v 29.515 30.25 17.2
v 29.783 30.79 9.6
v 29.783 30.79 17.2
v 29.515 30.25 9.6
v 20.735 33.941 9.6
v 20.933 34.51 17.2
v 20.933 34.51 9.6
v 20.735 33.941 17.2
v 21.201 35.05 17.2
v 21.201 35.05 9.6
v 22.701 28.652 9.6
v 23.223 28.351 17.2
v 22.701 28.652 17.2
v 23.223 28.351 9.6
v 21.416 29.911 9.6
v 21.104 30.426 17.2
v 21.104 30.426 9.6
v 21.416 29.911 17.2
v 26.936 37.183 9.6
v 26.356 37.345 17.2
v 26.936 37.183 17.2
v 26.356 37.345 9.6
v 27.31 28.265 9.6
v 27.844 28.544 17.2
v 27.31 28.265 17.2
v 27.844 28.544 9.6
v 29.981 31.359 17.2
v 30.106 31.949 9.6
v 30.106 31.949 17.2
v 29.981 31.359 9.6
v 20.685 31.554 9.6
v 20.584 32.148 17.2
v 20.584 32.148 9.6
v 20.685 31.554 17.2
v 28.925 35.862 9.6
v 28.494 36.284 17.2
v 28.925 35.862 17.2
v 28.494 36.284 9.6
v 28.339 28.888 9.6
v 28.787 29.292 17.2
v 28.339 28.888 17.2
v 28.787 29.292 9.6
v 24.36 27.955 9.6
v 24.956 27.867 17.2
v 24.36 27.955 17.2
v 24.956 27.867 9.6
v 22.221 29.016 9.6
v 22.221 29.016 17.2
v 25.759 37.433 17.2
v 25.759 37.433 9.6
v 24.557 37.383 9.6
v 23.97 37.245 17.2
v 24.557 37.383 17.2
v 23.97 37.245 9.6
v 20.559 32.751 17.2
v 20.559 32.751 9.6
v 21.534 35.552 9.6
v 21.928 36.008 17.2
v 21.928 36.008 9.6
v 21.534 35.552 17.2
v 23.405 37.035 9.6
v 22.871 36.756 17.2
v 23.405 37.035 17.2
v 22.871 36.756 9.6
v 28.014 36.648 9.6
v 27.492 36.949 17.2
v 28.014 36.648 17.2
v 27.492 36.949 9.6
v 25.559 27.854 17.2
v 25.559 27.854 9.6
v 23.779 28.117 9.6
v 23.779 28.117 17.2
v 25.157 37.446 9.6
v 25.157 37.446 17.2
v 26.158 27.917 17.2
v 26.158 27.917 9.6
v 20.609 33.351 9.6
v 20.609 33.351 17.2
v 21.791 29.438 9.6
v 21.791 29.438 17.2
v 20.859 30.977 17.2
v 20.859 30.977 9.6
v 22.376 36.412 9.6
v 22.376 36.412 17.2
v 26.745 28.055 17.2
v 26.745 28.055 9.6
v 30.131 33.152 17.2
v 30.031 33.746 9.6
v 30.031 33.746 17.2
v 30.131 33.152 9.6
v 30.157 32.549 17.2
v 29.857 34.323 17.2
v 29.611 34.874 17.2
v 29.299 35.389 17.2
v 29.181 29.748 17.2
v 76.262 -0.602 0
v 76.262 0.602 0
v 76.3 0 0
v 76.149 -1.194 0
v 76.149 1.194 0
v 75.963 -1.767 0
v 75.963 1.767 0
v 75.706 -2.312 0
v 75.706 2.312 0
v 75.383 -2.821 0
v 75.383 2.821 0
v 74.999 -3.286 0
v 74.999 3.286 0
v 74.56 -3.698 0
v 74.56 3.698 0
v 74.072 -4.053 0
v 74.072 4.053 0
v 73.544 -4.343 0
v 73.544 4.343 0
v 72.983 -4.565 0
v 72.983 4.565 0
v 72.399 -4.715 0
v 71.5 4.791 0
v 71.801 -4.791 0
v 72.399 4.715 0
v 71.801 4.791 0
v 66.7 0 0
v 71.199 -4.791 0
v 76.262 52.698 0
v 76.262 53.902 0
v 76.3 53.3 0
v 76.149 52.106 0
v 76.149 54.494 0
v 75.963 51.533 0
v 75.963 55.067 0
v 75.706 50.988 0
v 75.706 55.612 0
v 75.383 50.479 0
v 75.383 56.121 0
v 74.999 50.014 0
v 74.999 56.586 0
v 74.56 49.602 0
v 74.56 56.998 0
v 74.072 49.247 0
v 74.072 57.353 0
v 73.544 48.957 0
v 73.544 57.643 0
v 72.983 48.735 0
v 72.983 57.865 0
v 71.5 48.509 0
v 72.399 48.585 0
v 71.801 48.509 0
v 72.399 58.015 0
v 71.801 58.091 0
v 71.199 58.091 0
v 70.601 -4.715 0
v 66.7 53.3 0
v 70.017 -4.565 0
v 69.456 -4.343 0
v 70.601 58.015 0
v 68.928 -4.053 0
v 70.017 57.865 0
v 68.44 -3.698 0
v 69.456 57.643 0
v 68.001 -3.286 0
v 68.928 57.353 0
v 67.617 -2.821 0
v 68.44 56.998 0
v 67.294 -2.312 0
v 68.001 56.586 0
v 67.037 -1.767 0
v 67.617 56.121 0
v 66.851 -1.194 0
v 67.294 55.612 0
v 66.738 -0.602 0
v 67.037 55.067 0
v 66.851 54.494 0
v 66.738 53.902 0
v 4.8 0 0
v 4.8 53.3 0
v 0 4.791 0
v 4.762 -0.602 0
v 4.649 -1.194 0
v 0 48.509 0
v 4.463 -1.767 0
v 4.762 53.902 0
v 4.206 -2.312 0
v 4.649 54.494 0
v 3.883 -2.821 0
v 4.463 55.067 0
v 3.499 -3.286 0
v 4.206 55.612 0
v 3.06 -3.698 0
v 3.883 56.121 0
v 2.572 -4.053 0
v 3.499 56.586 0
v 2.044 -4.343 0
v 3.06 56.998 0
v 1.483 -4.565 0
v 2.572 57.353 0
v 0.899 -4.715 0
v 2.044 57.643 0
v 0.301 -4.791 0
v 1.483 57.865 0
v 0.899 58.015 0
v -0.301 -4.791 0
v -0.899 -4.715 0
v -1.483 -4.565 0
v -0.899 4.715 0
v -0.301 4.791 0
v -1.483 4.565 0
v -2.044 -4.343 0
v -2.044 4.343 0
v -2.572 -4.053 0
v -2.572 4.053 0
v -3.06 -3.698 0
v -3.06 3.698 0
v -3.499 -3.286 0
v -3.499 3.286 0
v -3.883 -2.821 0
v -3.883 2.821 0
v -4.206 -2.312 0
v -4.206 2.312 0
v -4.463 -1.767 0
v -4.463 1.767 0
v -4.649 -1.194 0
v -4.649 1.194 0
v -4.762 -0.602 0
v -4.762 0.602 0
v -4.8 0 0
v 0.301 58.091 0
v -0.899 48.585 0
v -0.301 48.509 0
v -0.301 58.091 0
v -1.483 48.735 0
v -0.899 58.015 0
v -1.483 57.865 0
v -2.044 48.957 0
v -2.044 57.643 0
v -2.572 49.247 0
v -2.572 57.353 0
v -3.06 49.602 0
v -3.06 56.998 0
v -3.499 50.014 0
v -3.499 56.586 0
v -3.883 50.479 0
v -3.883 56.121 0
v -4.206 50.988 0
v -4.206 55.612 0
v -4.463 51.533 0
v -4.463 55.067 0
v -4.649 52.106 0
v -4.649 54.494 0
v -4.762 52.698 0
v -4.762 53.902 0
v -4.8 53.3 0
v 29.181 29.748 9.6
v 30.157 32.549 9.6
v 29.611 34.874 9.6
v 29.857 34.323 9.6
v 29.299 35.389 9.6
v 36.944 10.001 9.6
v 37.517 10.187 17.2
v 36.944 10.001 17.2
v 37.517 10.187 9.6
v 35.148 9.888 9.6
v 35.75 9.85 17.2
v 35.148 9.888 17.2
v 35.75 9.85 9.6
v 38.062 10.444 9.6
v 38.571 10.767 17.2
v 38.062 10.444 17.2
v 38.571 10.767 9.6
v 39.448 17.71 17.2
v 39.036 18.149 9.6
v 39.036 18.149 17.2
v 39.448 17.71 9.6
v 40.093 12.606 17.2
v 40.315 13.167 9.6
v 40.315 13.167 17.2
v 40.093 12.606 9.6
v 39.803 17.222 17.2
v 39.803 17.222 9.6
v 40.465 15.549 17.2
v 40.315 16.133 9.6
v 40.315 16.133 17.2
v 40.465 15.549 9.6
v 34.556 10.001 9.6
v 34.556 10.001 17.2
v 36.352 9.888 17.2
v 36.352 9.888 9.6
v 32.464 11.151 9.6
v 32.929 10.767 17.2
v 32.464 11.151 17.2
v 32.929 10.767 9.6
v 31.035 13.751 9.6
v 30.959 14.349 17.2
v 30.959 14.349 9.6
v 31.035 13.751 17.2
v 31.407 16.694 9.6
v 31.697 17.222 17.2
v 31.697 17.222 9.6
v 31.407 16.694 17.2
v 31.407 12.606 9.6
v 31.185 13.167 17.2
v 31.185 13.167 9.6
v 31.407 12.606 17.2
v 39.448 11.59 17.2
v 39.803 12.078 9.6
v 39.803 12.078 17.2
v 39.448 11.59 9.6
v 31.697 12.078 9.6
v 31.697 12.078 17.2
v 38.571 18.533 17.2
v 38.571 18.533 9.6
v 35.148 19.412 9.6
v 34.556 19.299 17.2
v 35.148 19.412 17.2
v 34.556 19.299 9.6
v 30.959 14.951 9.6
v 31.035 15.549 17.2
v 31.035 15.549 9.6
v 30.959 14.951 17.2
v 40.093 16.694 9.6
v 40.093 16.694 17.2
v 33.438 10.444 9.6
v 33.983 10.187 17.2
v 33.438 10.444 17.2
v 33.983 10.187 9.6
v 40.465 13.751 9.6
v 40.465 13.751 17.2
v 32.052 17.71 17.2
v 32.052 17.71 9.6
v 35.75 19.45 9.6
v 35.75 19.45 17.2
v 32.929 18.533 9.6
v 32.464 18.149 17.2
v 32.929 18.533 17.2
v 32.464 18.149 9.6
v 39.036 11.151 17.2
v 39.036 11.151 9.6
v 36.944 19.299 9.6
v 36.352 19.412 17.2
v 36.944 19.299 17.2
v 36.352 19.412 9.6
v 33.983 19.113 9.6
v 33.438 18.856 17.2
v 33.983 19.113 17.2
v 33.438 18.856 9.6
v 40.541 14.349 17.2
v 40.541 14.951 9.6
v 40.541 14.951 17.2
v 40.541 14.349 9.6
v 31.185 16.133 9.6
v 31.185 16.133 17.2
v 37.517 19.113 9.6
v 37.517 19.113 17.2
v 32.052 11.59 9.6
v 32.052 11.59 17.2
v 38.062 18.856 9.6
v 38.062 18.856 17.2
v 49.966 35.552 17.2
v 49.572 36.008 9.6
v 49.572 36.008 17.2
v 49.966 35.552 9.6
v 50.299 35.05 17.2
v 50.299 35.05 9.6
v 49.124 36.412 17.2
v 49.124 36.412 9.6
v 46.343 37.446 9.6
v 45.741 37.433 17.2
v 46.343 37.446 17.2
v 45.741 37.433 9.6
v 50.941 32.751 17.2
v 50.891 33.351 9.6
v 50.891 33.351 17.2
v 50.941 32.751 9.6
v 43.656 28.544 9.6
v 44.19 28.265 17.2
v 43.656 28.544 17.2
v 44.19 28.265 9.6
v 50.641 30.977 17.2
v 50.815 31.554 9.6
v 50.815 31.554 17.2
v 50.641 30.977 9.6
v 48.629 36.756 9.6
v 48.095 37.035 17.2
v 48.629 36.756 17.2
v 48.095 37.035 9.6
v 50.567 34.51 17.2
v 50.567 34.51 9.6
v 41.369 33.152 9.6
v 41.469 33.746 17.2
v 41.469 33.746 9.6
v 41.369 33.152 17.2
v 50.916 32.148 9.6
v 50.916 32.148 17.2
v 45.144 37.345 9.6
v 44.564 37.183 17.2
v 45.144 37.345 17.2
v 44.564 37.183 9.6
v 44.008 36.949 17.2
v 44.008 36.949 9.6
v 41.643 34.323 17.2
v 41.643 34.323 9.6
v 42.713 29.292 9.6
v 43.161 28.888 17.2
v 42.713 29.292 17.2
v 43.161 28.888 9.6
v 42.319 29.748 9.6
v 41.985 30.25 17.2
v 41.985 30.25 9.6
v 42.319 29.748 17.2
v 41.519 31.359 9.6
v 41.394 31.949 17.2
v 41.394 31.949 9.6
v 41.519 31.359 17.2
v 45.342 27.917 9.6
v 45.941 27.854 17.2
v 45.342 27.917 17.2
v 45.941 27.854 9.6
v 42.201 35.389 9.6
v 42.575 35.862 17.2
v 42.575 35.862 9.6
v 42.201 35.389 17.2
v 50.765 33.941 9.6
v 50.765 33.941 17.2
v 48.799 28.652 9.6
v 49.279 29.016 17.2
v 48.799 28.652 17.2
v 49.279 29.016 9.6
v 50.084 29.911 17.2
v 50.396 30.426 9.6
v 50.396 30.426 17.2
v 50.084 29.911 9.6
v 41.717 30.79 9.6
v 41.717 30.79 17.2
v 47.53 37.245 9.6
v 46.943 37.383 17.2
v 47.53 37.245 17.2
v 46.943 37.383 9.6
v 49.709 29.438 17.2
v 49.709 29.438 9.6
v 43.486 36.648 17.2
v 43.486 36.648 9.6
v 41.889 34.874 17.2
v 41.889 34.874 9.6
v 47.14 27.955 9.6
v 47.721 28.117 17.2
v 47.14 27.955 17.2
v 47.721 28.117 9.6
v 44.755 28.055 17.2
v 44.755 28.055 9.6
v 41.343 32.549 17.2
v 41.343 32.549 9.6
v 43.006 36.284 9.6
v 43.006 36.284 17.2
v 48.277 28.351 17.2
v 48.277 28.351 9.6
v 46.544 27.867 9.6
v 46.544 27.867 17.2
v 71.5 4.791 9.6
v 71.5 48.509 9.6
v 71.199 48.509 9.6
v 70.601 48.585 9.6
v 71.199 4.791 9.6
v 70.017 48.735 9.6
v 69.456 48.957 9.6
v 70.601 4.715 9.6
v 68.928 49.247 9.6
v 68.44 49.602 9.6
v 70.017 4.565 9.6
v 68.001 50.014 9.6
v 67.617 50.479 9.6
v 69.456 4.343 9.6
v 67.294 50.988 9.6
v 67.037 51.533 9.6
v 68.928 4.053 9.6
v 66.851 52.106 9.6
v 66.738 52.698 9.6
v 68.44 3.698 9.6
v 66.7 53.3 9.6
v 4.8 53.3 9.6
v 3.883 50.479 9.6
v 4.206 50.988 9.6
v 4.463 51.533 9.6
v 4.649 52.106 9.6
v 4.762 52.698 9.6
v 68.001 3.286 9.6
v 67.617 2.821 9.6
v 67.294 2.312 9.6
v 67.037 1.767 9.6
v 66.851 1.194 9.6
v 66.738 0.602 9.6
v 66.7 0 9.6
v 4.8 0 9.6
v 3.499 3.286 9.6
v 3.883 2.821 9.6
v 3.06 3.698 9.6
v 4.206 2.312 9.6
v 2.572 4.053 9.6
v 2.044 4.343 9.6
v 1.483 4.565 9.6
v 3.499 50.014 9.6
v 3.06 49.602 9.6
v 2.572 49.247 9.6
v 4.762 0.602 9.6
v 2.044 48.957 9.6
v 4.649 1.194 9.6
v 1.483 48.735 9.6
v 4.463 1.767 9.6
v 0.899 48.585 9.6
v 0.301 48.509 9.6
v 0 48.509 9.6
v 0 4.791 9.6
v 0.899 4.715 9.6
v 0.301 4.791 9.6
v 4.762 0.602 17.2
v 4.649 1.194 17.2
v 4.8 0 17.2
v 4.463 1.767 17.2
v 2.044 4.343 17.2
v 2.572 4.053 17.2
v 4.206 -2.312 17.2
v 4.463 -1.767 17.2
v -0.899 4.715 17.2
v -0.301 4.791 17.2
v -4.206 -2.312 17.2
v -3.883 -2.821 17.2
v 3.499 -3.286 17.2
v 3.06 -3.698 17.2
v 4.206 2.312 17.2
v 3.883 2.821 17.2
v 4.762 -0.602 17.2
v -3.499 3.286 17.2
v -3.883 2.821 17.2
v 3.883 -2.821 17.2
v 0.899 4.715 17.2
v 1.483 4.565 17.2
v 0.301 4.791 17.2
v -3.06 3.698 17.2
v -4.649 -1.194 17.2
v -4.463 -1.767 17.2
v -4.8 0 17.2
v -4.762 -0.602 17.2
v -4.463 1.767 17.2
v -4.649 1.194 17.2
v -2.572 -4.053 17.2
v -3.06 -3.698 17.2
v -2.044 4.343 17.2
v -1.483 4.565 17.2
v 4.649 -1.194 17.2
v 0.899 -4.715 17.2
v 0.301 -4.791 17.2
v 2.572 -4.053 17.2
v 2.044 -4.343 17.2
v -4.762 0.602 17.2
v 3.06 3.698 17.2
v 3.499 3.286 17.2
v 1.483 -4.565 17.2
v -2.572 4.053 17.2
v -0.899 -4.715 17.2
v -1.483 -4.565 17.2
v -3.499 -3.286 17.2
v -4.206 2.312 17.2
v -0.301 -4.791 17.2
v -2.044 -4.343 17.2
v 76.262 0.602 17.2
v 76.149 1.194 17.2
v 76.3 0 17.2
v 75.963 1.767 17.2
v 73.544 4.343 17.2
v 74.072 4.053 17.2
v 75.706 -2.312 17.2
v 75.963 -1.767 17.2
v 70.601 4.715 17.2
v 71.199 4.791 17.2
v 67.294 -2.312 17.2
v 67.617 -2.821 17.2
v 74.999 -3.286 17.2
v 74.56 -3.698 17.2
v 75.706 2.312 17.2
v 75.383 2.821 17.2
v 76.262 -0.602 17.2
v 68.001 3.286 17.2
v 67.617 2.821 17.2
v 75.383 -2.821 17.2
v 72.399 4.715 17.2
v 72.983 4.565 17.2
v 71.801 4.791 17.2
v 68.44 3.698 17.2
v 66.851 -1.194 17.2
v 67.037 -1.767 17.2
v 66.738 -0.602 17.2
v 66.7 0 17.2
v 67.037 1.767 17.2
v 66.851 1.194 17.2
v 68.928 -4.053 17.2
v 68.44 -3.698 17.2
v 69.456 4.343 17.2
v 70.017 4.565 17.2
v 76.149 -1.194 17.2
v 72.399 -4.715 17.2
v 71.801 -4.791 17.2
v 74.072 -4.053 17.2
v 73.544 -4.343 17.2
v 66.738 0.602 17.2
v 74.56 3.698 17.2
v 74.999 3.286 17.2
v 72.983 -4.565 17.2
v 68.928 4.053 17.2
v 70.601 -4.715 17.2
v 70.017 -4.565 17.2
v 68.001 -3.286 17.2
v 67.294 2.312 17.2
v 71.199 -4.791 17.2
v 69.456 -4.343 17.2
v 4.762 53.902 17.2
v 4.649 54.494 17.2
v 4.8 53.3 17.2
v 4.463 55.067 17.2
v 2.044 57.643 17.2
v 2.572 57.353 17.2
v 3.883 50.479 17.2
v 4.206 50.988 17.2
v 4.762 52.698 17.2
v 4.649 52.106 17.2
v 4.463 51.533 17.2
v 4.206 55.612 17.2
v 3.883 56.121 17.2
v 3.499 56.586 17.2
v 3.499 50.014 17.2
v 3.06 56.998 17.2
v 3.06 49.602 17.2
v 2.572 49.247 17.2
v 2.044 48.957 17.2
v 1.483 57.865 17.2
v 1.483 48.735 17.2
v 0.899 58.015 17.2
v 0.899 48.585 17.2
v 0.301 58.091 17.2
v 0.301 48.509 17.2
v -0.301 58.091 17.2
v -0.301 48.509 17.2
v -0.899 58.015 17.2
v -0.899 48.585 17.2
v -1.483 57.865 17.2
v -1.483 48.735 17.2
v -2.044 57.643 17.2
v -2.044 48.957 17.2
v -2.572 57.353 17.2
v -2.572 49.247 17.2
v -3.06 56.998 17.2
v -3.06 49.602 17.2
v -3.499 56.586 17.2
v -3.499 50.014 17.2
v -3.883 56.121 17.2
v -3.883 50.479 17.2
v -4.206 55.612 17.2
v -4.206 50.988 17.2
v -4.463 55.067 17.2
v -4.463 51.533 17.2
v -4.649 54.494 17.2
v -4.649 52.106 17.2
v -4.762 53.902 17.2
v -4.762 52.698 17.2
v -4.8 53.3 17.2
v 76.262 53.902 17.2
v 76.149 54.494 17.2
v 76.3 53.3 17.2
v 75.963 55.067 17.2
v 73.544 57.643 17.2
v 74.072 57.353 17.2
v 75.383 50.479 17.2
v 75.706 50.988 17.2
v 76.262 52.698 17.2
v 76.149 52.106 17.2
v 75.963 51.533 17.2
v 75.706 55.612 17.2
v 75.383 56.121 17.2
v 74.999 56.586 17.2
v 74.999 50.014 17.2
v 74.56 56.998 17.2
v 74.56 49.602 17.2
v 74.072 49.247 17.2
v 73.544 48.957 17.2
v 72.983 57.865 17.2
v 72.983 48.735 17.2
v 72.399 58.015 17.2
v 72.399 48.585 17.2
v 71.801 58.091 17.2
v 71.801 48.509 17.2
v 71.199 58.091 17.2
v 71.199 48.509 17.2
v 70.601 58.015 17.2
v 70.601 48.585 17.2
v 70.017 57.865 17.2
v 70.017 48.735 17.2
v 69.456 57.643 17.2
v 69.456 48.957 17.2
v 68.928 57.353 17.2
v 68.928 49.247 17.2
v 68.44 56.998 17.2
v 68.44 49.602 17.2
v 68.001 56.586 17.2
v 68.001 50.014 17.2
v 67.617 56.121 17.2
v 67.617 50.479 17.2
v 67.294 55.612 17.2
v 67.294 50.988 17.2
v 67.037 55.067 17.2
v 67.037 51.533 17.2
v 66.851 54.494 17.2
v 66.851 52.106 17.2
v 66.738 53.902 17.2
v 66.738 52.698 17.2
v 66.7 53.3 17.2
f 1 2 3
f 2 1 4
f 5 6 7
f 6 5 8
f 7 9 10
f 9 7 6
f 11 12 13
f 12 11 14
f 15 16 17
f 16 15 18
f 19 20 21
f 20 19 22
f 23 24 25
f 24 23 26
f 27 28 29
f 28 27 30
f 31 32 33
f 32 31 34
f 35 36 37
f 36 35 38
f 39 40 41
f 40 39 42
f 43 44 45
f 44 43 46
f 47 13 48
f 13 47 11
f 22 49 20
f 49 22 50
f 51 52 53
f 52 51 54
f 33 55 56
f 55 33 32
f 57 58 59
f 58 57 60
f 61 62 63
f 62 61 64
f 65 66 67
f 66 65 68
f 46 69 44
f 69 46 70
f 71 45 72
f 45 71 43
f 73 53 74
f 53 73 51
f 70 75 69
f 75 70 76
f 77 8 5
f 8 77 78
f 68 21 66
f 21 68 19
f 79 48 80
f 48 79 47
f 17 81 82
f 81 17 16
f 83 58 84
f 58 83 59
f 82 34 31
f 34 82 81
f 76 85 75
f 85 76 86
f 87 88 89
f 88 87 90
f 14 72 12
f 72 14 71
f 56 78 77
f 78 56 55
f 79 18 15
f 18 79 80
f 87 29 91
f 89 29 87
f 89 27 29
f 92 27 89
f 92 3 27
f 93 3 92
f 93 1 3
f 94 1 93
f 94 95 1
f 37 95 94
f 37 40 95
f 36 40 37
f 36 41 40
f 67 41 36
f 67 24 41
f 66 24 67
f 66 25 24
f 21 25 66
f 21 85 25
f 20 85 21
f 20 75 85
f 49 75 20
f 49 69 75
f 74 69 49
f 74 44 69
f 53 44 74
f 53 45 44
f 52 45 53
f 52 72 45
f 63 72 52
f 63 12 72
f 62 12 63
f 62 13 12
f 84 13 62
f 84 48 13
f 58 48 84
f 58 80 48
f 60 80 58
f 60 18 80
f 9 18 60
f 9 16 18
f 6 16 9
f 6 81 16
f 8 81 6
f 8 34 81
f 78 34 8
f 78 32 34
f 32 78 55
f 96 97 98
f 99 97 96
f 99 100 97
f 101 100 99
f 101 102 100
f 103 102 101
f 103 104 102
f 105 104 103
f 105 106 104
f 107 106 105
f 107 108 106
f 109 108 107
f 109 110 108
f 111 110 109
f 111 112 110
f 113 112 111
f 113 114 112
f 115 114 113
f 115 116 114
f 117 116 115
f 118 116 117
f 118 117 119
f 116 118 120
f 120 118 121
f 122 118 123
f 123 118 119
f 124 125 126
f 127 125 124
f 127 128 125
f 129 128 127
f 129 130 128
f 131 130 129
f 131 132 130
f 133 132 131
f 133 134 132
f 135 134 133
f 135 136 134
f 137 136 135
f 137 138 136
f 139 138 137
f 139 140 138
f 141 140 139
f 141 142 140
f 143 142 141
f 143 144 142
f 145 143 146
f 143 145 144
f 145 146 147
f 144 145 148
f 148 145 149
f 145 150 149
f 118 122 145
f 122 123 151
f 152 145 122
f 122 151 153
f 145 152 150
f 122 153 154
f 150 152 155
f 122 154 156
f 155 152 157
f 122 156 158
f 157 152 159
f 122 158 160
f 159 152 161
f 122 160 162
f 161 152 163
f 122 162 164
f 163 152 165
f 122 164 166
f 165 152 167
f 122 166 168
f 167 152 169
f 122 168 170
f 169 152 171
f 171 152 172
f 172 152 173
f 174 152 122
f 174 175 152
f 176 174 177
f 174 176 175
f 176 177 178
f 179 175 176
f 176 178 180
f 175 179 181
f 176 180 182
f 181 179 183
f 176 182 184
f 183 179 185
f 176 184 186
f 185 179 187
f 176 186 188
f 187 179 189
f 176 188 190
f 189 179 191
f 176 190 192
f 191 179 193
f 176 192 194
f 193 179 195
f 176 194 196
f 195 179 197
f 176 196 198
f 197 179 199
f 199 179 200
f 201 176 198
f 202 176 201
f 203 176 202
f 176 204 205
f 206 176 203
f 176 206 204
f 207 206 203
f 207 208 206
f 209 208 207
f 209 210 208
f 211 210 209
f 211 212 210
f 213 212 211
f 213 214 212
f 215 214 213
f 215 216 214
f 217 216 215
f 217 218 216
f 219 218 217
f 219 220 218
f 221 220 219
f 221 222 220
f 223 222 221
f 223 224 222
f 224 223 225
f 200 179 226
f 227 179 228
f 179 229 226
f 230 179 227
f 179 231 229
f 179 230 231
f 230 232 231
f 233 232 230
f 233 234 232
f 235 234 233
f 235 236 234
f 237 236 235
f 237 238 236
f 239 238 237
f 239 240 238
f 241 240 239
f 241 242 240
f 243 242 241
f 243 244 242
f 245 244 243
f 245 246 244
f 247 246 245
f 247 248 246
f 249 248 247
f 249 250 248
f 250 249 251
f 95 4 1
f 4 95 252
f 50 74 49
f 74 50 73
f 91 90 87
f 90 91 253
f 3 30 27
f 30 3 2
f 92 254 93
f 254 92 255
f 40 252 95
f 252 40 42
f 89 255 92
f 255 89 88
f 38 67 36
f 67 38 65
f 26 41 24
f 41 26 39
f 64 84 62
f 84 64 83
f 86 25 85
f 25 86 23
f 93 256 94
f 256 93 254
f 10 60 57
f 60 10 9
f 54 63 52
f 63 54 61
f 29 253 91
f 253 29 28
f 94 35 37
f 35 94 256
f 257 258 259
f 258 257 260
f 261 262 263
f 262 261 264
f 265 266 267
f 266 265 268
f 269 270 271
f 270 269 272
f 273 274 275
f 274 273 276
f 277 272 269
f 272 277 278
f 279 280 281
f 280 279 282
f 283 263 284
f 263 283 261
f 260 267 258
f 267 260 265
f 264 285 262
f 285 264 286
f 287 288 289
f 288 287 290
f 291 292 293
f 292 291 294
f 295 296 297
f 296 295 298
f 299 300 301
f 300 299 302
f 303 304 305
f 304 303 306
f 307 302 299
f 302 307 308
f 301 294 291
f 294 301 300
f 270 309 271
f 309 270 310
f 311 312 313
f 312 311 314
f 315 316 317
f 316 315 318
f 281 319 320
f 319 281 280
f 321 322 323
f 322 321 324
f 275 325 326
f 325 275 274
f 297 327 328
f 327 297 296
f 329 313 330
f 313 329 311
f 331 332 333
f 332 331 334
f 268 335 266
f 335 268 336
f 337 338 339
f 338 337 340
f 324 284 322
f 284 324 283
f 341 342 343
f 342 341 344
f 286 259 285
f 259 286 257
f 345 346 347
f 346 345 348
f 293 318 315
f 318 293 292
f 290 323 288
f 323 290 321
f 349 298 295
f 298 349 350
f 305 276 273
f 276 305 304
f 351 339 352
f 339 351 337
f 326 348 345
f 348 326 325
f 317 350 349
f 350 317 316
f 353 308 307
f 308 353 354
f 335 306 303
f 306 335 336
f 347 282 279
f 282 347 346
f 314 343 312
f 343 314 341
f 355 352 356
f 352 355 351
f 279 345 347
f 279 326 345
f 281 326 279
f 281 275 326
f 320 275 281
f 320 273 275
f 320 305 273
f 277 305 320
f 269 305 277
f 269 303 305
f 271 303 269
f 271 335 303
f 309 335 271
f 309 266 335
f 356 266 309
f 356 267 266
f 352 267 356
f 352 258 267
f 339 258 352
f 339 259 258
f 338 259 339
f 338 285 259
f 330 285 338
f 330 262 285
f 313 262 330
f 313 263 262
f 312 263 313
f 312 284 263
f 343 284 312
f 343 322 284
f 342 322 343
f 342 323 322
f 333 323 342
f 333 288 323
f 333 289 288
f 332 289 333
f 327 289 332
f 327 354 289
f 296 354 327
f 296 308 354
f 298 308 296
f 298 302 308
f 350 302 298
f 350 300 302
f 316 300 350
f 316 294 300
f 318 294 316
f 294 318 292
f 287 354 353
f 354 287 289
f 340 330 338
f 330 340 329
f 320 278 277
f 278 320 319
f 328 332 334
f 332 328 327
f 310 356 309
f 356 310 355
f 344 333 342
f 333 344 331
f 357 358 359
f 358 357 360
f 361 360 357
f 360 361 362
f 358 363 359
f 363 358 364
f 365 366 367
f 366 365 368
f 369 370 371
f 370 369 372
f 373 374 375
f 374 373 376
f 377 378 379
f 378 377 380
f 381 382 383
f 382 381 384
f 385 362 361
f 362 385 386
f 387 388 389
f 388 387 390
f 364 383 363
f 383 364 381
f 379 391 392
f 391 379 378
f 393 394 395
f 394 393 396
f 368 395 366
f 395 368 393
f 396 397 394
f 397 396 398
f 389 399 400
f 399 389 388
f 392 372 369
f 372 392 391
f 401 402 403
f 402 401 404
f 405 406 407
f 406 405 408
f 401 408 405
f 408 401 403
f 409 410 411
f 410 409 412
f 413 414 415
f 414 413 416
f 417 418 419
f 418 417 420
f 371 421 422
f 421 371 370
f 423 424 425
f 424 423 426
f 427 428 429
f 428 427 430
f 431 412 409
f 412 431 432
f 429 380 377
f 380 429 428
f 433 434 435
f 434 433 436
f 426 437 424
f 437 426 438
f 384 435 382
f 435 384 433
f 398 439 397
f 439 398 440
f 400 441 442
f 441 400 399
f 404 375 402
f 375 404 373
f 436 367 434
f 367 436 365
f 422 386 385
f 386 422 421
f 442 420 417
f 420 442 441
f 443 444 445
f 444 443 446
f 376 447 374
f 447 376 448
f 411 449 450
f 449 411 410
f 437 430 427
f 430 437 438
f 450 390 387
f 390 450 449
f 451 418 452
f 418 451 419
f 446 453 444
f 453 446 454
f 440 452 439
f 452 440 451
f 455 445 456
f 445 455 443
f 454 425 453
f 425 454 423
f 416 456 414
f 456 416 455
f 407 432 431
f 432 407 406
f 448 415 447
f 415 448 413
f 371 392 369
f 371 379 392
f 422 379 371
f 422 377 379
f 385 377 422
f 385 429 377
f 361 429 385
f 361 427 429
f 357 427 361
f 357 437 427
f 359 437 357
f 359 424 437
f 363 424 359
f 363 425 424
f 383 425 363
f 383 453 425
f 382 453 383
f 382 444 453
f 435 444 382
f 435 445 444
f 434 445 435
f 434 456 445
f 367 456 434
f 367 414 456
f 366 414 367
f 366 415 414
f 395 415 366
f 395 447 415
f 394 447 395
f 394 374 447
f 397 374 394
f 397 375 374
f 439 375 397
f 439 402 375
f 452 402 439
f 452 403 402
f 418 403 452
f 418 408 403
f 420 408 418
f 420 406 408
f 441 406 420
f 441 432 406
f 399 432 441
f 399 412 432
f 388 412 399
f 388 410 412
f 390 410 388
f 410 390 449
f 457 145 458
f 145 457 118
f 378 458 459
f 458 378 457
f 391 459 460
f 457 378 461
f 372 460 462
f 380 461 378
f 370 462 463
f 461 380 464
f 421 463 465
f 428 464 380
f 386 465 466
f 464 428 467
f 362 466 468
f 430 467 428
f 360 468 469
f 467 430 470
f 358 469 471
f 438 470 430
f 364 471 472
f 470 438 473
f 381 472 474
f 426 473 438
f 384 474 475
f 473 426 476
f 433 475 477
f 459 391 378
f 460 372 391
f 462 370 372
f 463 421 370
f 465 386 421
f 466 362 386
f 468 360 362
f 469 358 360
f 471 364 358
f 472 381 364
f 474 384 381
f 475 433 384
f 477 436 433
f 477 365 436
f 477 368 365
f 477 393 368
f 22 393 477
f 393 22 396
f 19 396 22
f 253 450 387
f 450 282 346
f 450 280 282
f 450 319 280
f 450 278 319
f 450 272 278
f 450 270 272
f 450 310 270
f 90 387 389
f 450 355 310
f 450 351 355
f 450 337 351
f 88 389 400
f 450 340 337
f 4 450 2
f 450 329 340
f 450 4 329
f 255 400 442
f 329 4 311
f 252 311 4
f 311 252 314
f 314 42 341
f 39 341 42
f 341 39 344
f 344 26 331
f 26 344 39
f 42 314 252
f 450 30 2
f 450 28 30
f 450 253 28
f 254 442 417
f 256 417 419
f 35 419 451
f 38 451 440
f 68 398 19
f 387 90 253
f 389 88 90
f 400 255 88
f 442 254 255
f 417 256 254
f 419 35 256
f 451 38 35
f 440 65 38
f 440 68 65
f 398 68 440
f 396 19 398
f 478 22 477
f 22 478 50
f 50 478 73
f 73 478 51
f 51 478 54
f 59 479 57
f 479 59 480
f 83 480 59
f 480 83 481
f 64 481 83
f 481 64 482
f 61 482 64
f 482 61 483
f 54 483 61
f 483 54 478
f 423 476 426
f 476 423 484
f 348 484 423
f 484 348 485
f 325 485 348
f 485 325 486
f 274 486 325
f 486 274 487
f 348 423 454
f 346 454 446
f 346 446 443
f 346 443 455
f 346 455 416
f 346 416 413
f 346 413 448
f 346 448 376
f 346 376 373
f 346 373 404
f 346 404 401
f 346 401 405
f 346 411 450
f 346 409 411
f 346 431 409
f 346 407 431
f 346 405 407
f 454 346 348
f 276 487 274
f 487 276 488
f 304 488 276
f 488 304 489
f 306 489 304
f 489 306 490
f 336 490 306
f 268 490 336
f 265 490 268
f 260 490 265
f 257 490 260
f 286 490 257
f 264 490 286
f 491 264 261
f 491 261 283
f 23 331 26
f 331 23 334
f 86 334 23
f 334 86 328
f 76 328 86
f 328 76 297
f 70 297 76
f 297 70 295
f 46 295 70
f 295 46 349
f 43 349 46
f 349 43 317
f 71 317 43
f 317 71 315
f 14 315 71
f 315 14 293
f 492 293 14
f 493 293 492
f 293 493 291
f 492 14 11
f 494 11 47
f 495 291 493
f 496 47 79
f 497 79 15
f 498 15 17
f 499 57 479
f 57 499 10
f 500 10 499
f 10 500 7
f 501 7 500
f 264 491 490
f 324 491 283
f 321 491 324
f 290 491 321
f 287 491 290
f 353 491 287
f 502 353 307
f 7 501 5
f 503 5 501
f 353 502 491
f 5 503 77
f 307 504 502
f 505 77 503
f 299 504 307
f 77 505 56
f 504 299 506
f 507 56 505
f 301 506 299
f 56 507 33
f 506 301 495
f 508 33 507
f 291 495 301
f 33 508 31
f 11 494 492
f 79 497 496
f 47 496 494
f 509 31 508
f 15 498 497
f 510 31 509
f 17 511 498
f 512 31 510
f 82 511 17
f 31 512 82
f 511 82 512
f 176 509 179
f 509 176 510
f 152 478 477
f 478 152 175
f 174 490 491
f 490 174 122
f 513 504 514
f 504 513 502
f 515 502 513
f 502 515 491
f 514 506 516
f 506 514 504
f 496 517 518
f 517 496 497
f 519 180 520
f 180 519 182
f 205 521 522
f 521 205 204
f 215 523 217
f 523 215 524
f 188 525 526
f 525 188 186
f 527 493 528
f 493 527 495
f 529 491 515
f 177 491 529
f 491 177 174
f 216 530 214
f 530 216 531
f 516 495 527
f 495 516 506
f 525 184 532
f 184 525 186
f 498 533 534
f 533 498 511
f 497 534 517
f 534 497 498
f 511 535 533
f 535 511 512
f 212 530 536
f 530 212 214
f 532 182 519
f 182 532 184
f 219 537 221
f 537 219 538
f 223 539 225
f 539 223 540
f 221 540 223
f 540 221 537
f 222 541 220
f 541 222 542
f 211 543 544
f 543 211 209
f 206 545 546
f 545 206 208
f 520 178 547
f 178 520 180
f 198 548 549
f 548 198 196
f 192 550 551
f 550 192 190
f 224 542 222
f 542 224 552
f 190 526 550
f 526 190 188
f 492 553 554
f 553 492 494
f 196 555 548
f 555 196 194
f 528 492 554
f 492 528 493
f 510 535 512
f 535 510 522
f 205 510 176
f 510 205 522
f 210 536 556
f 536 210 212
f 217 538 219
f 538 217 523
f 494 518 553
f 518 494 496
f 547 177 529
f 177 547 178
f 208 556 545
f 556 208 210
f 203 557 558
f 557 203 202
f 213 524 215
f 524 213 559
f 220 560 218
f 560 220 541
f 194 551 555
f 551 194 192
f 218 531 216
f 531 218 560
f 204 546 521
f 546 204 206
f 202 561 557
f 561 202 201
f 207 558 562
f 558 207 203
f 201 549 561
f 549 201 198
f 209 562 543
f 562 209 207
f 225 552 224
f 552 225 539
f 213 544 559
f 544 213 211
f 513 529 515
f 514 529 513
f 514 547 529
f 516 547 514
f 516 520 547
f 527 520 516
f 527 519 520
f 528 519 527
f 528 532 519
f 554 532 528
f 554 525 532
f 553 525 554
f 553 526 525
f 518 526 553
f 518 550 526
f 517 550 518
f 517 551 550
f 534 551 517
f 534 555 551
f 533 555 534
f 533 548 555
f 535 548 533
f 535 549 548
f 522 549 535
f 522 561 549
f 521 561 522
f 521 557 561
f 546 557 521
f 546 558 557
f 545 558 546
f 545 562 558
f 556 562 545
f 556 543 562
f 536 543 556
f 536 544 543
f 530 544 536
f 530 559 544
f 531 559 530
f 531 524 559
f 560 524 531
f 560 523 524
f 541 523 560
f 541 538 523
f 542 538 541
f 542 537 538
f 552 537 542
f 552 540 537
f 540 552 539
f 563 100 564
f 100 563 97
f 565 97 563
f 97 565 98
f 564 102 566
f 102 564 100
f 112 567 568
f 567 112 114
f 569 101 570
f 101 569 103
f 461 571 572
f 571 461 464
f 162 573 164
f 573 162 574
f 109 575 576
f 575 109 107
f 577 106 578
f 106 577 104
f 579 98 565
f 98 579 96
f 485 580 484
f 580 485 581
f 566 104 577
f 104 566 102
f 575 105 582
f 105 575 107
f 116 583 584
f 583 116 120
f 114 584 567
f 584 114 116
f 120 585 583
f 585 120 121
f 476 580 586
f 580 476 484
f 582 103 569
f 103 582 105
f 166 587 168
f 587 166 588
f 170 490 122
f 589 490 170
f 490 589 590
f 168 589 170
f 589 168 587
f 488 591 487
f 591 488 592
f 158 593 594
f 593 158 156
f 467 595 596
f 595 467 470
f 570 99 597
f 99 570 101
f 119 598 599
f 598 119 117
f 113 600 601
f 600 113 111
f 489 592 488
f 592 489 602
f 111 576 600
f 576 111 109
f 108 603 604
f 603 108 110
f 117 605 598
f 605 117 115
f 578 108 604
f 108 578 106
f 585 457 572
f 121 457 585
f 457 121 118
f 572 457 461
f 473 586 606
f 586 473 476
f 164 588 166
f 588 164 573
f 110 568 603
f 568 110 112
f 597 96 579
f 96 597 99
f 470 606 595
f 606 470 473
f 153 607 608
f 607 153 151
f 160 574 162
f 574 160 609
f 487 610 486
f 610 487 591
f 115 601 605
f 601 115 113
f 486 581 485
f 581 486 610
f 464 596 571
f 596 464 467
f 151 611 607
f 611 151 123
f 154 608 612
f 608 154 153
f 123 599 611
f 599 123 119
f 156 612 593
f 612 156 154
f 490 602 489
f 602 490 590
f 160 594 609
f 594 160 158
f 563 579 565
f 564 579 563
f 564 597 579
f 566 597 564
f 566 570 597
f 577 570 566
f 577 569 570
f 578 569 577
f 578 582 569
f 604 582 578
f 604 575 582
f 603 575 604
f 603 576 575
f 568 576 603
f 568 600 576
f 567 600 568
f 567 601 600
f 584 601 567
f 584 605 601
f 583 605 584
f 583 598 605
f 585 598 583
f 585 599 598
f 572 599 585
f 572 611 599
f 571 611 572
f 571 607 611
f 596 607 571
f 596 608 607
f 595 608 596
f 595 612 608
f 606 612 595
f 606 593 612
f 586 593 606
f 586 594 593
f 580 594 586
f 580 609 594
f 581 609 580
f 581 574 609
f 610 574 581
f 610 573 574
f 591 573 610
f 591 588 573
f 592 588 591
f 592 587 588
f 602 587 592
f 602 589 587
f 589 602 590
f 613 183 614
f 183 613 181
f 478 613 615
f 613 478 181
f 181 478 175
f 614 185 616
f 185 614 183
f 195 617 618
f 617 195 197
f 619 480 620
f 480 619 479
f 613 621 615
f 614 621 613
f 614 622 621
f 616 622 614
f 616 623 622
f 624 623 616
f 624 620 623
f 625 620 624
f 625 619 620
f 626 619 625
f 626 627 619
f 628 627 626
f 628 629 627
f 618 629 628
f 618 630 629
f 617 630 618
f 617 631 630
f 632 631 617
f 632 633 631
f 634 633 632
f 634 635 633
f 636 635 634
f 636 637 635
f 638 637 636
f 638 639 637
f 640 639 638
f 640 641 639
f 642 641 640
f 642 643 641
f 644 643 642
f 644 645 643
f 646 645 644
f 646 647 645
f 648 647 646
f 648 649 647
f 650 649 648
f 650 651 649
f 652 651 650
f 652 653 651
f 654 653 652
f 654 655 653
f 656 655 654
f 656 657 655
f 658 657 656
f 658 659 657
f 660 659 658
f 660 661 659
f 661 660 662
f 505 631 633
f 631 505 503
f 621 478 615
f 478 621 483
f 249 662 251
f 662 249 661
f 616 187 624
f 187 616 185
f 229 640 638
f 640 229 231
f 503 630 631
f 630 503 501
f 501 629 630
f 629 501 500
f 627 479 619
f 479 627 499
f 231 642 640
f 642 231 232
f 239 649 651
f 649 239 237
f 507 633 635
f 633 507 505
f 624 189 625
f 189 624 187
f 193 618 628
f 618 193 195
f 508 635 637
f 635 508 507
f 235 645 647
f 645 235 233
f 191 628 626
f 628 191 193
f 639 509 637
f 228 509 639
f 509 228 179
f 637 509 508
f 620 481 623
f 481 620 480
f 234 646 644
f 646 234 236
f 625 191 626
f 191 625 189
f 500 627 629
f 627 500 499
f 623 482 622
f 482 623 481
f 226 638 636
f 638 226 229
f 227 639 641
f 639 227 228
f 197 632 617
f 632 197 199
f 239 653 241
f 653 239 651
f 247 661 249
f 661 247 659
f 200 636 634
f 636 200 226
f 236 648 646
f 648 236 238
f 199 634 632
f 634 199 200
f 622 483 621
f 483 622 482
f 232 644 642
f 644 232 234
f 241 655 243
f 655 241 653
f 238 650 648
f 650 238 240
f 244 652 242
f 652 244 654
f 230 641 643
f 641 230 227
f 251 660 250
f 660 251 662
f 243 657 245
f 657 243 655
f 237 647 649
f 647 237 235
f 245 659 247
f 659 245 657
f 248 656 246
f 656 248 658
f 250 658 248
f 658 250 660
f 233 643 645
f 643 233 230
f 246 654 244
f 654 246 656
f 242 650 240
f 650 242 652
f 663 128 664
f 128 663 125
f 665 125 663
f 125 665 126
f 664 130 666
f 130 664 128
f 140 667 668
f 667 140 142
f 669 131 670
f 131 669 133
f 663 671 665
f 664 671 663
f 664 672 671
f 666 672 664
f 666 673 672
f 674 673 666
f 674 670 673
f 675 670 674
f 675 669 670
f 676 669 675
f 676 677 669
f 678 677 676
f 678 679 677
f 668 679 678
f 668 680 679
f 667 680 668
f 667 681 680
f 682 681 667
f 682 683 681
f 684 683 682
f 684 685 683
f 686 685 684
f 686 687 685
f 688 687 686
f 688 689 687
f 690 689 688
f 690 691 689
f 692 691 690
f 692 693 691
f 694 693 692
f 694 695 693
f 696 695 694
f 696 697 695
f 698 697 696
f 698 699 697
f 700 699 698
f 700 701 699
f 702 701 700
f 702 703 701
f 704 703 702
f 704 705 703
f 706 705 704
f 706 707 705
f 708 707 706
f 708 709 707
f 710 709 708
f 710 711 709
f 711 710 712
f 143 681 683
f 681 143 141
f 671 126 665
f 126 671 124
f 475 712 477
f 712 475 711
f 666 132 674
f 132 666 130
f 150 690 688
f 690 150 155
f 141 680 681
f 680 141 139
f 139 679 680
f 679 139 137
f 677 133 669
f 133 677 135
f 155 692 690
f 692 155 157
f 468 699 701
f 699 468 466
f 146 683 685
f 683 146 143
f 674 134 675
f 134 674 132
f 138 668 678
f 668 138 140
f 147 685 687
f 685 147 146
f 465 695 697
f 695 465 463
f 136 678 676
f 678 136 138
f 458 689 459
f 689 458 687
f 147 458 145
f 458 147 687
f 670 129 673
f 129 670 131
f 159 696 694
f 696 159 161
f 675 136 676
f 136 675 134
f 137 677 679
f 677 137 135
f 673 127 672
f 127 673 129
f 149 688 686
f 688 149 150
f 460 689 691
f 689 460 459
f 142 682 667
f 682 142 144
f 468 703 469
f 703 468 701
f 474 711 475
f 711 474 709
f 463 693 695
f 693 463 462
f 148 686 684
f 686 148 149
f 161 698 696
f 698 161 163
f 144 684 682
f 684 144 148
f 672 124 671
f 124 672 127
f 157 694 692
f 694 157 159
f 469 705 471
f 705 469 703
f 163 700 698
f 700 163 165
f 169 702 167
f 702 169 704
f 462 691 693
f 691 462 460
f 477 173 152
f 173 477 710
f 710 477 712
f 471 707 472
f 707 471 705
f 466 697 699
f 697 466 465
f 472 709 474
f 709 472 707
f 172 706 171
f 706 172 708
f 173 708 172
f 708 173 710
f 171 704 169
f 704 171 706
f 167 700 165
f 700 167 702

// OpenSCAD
$fn = 50;

s = 1.3;

x = 55*s;
y = 41*s; 
z = 9.6;

ultra = 18*s;

cylHeight = 17.2;
cylRad = 9.6/2;

oddCylShift = ultra*sin(30);

module cyl(){
	cylinder(r=cylRad, h=cylHeight);
}

module centerEquilateralTriangle(count, distance){
	cir = 360;
	rot = cir/count;
	for(i = [1:count]){
		rotate([0,0,i*rot])
		translate([distance,0,0])
		cyl();
	}
}

module mainPart() {
	union(){
		cube([x,y,z]);
		
		cyl();
		
		translate([x,0,0])
		cyl();
		
		translate([0,y,0])
		cyl();

		translate([x,y,0])
		cyl();
		
		translate([x/2, y/2,0])
		rotate([0,0,30])
		centerEquilateralTriangle(3, 12);
	}
}

mainPart();
